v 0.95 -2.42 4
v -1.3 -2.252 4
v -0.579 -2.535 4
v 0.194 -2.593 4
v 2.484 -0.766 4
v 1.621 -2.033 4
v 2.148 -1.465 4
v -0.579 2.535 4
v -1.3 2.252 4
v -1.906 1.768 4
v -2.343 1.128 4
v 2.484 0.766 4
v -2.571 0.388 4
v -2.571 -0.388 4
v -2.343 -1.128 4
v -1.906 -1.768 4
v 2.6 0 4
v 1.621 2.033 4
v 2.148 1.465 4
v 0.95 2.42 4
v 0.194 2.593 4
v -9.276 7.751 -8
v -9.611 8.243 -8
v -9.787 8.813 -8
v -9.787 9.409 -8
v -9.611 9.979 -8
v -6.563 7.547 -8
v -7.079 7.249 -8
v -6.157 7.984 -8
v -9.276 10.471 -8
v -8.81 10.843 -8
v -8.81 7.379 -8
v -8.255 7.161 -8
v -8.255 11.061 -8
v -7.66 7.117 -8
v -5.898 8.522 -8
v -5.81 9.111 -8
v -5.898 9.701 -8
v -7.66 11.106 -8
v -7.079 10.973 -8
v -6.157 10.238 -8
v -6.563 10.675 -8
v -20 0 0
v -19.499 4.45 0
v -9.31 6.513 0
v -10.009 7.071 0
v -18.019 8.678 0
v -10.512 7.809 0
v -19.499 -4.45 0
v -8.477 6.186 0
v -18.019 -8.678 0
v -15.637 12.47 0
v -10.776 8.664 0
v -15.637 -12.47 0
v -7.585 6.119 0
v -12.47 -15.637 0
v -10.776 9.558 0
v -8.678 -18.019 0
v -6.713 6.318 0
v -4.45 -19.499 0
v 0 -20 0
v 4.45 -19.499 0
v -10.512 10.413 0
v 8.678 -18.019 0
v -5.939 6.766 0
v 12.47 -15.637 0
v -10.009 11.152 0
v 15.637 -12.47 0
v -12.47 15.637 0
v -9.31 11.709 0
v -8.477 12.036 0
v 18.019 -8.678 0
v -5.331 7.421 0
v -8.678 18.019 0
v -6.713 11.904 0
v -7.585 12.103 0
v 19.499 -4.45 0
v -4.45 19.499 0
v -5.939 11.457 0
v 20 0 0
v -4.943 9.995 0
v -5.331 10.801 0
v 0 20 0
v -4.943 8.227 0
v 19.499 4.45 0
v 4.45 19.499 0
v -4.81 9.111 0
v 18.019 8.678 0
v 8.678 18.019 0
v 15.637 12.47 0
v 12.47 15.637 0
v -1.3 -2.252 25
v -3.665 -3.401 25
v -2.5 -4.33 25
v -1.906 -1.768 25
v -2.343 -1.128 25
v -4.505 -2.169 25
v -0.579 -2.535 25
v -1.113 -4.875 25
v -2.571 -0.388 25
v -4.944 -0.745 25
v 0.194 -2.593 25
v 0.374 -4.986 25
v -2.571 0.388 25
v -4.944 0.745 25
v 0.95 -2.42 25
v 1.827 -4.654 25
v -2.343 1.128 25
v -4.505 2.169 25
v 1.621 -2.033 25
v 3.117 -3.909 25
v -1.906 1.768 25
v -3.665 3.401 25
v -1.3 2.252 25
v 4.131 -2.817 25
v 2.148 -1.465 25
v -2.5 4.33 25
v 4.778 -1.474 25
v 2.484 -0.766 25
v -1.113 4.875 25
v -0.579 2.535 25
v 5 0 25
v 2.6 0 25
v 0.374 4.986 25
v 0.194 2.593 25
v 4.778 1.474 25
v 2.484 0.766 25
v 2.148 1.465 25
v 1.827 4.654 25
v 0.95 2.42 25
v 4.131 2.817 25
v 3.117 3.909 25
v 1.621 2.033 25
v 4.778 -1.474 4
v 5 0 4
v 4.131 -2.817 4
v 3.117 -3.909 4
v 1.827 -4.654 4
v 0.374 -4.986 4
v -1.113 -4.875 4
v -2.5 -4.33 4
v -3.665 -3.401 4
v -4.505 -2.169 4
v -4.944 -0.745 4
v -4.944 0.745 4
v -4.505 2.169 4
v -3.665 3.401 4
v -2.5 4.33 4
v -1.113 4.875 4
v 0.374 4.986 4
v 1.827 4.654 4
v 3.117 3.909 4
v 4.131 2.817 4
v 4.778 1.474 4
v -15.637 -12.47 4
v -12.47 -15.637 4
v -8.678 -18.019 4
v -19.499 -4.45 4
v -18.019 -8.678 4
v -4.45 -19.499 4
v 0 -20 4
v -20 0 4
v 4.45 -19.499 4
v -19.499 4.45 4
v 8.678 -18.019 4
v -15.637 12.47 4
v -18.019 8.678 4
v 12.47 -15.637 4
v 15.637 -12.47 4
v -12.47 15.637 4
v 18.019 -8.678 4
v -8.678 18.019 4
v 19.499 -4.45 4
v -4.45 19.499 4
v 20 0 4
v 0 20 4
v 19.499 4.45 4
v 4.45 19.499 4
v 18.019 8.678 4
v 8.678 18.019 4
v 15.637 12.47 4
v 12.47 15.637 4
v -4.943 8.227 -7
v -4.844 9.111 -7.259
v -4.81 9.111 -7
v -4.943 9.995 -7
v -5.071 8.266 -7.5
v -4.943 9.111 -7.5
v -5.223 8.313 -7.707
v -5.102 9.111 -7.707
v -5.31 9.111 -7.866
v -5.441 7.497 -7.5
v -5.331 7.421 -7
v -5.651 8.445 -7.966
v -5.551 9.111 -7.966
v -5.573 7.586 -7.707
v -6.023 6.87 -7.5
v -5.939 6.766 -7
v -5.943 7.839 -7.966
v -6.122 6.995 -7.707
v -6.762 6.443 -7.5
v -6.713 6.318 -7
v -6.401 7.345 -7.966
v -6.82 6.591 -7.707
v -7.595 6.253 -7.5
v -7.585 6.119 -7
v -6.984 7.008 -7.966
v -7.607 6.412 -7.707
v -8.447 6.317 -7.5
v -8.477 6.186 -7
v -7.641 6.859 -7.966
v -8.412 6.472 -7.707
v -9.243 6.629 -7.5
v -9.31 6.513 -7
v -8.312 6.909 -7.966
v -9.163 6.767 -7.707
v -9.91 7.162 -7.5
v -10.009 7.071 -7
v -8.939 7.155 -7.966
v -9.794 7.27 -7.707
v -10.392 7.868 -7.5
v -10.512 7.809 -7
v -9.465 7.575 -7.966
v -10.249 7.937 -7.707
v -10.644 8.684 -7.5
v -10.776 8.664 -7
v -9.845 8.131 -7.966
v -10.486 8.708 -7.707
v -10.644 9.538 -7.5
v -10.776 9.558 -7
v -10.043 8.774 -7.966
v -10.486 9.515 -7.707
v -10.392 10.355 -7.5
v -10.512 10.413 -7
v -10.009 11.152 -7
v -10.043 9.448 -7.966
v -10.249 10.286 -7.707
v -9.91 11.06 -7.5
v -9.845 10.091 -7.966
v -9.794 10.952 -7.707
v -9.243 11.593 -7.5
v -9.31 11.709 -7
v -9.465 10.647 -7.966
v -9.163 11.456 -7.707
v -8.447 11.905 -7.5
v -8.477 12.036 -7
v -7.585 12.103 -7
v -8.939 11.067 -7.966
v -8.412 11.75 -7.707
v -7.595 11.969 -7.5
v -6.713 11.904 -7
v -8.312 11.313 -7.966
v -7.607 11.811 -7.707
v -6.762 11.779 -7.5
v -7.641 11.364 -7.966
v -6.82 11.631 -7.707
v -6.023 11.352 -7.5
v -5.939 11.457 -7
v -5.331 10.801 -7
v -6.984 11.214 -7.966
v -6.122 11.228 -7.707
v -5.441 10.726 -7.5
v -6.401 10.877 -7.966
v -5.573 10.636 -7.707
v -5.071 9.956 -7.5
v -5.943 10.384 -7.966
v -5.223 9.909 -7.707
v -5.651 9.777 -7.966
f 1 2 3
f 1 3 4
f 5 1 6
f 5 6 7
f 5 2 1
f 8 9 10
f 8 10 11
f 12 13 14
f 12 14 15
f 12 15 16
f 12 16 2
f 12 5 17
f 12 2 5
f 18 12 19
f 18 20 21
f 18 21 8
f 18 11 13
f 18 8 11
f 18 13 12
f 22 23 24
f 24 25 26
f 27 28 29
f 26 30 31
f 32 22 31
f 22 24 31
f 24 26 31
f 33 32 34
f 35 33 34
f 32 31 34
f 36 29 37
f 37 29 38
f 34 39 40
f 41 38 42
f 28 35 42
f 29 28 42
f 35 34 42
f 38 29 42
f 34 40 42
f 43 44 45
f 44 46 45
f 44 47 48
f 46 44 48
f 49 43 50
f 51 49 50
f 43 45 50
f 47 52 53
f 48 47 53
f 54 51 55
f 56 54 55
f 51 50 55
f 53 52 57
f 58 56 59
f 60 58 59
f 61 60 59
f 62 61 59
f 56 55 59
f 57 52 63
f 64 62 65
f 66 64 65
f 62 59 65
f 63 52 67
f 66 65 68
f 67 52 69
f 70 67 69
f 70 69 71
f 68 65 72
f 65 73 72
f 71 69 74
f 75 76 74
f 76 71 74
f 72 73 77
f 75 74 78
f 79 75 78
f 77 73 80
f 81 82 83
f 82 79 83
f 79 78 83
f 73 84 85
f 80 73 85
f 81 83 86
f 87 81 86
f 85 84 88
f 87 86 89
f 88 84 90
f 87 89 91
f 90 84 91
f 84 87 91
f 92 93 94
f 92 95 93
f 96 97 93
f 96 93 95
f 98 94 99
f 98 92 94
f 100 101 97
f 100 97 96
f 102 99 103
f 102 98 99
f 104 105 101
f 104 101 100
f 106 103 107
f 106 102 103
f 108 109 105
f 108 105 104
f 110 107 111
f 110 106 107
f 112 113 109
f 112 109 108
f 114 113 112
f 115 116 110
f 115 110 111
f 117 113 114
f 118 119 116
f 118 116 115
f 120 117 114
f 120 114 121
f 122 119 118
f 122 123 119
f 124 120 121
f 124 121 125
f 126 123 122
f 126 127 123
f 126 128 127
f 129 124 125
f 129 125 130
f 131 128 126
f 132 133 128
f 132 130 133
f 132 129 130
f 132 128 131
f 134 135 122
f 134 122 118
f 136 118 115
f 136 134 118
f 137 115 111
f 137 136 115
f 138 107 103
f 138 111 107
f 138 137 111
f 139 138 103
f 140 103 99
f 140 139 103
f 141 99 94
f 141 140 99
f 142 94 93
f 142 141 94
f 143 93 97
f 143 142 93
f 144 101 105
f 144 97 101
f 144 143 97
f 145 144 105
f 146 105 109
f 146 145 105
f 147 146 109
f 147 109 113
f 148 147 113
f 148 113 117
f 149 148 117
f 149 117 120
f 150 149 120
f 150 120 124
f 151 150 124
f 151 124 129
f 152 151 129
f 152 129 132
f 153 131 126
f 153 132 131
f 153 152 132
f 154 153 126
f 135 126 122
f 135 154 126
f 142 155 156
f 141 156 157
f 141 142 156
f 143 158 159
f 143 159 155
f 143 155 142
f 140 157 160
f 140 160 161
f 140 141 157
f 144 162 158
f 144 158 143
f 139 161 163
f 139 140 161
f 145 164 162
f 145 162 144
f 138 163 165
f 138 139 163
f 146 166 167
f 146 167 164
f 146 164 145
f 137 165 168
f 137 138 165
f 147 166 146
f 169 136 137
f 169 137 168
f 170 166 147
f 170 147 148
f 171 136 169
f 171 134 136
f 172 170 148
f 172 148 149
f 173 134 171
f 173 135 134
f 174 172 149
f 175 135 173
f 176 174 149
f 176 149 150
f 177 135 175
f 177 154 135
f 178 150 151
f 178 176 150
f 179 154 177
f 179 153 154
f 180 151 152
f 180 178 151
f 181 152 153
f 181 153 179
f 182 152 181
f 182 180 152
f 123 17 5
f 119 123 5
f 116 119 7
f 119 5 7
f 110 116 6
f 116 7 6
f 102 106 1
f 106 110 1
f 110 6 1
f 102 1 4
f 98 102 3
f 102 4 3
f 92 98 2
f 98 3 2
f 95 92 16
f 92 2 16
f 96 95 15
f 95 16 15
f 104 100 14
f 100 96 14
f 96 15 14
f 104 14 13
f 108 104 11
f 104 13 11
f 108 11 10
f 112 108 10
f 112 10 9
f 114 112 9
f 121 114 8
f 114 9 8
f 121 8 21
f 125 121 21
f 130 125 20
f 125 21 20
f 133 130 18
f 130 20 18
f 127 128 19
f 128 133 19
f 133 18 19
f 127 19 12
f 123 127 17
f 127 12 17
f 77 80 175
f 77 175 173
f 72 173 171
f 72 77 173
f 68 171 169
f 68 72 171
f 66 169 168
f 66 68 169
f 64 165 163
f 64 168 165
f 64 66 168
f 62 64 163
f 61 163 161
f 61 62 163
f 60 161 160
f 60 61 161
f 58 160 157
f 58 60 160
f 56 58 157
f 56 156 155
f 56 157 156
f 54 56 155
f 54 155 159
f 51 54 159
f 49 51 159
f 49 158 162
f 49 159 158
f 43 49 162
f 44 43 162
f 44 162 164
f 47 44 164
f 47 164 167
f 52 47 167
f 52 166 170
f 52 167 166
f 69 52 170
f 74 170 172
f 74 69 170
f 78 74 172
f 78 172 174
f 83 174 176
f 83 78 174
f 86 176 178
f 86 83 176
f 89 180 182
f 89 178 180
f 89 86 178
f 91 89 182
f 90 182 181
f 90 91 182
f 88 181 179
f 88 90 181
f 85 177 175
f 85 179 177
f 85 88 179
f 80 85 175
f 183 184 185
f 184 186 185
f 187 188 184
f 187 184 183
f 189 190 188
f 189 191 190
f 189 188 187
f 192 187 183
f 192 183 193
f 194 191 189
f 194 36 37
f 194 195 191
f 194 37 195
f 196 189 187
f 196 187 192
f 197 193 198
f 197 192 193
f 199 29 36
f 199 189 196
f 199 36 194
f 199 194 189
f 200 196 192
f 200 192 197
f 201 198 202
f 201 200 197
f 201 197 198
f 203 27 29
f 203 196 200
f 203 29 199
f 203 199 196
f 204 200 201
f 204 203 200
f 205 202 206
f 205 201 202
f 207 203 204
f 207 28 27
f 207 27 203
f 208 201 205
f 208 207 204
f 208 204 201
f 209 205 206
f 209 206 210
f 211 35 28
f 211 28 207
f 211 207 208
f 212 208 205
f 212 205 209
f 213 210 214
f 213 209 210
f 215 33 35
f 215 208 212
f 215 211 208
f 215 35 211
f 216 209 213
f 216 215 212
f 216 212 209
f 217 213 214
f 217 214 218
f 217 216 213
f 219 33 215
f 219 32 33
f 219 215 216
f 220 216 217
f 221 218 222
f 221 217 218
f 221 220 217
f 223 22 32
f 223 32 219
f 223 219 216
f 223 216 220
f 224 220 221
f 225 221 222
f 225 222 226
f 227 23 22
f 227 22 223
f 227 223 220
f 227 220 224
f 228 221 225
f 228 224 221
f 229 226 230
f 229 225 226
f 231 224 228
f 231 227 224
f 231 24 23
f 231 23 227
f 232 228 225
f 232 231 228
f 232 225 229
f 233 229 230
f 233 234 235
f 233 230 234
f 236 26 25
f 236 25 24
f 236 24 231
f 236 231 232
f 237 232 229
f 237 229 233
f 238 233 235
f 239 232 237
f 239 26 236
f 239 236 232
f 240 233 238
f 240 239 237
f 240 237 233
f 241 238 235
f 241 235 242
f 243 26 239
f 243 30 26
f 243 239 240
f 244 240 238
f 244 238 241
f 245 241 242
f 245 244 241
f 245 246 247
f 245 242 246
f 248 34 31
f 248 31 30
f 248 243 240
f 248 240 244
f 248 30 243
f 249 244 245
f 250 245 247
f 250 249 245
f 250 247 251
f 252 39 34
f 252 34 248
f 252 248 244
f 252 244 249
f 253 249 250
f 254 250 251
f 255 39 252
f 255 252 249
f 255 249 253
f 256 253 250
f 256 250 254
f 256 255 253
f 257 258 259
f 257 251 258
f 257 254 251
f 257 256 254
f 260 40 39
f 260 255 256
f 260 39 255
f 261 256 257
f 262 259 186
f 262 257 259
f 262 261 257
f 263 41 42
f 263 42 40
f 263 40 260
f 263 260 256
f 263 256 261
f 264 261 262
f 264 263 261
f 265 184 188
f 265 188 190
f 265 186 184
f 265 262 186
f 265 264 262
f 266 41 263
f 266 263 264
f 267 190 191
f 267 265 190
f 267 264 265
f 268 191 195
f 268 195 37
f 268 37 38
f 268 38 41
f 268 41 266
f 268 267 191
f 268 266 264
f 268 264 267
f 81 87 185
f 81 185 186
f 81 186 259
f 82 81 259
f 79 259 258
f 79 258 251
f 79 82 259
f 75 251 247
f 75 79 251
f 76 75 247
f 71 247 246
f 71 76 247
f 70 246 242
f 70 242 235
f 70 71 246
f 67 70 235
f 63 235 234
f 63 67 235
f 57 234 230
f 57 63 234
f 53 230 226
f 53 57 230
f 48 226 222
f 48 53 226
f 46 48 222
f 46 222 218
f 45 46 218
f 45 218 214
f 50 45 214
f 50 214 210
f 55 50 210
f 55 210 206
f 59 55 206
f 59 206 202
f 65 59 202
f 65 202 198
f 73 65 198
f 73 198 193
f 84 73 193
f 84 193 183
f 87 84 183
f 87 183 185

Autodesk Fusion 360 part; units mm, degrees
sketch "Boceto1" plane through (0, 0, 0) normal (0, 0, 1) x (1, 0, 0)
  circle A0 centre (0, 0) radius 20
  circle A1 centre (0, 0) radius 2.6
  circle A2 centre (-7.8095, 9.1111) radius 3
  dimension "d1" = 40
  dimension "d2" = 5.2
  dimension "d20" = 6
  dimension "d21" = 12
extrude "Extruir1" add sketch "Boceto1" along normal blind 4 contours A0 | A1 | A2
sketch "Boceto2" plane through (0, 0, 4) normal (0, 0, 1) x (1, 0, 0)
  circle A0 centre (0, 0) radius 20
  circle A1 centre (0, 0) radius 2.6
  circle A2 centre (0, 0) radius 5
  dimension "d14" = 5.2
  dimension "d15" = 10
extrude "Extruir2" add sketch "Boceto2" along normal blind 21 contours A2
sketch "Boceto3" plane through (0, 0, 0) normal (1, 0, 0) x (0, 0, -1)
  circle A0 centre (-22, 0) radius 1
  dimension "d18" = 2
extrude "Extruir4" add sketch "Boceto1" against normal blind 8 contours A2
fillet "Empalme1" radius 1 1 edges at (-10.6065, 10.1959, -8)
